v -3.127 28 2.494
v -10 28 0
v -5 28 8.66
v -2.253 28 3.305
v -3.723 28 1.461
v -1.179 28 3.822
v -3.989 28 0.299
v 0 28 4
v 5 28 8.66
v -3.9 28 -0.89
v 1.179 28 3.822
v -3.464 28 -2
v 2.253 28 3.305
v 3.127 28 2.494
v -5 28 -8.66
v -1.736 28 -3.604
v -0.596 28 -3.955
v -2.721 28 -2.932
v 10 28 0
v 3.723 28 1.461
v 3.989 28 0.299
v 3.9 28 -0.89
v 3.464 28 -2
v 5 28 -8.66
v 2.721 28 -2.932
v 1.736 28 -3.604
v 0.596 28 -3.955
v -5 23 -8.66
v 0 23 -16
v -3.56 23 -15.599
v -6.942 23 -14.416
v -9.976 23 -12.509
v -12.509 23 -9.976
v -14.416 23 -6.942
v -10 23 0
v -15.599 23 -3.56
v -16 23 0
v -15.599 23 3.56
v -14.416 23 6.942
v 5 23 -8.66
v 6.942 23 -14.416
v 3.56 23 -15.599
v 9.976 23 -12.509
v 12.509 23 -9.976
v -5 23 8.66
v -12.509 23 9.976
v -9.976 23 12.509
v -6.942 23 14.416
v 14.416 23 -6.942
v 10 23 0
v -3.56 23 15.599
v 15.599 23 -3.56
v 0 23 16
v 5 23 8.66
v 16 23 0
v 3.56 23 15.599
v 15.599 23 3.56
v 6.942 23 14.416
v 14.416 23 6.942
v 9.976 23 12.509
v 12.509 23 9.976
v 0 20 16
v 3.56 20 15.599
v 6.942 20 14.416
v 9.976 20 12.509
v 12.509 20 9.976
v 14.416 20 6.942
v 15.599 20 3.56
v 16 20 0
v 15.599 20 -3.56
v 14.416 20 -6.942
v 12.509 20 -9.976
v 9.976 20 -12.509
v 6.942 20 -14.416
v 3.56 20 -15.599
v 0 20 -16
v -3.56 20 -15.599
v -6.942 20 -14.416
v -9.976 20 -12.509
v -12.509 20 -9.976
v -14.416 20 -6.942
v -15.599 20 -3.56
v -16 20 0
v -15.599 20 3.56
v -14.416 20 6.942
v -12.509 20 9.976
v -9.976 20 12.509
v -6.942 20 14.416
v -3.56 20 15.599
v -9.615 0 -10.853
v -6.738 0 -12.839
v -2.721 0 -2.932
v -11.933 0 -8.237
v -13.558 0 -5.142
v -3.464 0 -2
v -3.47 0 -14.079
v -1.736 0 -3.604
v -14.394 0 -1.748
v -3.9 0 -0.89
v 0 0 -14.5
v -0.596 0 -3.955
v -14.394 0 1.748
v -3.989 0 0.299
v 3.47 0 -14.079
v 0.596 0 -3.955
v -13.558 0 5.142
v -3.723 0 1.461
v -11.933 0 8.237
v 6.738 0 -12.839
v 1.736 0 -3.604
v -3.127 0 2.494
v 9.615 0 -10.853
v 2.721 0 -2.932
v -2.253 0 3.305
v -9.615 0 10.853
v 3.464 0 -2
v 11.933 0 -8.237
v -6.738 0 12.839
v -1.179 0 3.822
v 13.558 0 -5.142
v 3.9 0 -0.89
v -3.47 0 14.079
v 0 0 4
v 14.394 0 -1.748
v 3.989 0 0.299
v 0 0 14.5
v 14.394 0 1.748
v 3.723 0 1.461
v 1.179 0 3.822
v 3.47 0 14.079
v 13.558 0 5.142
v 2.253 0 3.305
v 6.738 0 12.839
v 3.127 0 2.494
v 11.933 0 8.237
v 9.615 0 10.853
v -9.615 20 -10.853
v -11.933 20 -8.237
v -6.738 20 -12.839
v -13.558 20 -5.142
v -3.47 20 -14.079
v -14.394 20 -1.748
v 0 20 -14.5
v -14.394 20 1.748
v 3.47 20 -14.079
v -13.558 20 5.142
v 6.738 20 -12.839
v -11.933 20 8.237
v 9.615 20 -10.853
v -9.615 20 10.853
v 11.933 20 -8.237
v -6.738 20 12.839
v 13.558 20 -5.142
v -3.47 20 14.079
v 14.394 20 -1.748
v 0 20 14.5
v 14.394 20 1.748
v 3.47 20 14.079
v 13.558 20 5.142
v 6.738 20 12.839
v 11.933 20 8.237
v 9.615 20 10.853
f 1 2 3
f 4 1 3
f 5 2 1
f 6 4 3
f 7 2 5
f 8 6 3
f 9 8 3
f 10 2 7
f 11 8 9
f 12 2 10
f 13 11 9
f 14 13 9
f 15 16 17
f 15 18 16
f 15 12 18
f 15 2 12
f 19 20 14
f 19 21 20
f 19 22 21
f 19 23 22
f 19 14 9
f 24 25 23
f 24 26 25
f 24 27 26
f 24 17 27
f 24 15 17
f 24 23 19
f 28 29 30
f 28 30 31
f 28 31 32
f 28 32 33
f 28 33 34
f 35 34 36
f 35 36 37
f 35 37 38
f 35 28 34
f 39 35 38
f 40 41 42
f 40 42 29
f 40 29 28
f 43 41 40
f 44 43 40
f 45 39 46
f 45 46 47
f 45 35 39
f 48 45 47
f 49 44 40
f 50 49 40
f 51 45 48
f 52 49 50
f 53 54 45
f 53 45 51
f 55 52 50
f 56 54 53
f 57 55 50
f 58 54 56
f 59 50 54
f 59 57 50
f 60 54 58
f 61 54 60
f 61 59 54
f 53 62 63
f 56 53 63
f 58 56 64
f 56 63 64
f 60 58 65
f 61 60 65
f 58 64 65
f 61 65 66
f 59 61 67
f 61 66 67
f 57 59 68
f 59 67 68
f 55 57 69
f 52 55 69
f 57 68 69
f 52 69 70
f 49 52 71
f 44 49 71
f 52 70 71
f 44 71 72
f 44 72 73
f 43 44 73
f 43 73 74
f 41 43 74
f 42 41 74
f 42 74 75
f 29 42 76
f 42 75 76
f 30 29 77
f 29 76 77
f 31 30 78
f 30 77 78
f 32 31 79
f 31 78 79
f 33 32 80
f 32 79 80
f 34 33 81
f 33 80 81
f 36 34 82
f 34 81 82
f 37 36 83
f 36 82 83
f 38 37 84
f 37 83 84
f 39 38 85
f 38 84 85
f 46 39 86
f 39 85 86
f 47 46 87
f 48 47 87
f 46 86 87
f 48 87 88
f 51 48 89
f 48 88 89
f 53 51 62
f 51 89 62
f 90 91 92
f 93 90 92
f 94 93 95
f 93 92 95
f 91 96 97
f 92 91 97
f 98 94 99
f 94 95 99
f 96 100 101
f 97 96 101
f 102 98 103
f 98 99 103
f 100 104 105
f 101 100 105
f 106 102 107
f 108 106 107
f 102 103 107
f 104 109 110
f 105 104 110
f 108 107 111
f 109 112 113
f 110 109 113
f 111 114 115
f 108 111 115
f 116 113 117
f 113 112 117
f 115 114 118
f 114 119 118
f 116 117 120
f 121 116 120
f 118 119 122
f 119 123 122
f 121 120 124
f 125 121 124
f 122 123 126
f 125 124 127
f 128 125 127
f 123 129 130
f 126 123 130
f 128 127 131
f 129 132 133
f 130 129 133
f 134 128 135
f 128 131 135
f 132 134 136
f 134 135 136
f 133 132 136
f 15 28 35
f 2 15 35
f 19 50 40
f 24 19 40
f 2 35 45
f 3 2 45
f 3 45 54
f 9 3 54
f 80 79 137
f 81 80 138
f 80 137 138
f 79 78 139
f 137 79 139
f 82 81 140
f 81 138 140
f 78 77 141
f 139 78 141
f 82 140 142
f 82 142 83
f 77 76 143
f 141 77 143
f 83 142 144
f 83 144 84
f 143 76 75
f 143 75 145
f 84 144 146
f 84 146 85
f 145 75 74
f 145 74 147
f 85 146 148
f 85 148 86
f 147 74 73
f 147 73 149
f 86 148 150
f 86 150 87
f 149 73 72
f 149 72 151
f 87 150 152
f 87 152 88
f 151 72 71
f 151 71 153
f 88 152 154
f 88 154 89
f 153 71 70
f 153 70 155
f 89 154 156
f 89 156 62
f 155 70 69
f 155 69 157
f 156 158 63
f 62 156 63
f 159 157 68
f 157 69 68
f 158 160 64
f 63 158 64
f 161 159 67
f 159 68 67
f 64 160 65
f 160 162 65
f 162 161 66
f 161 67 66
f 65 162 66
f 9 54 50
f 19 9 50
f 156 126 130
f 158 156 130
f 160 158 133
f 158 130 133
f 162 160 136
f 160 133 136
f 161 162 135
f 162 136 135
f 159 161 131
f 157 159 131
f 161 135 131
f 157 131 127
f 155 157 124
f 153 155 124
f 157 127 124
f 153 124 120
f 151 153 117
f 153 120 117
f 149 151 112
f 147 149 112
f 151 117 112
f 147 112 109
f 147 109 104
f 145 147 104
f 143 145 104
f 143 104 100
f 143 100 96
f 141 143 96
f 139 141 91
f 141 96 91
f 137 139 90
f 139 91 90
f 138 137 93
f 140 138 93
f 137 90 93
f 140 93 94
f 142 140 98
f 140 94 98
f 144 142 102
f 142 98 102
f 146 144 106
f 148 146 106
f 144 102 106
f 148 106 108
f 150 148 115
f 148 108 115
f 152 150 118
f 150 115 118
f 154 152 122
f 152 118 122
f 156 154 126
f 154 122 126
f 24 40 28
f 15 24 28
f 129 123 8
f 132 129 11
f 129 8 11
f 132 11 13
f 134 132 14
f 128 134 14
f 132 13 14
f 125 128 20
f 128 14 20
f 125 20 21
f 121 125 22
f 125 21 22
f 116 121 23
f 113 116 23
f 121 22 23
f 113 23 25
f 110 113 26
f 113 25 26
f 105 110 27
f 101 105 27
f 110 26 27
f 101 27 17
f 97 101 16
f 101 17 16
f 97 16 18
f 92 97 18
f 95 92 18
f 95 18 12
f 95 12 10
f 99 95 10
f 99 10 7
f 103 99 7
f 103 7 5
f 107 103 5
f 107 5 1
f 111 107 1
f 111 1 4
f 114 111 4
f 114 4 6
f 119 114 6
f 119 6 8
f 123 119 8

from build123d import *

# Parameters (mm, degrees)
SKETCH1_R           = 14.5
BOSS_EXTRUDE1_DEPTH = 20
SKETCH2_R           = 16
BOSS_EXTRUDE2_DEPTH = 3
BOSS_EXTRUDE3_DEPTH = 5
SKETCH4_R           = 4
CUT_EXTRUDE1_DEPTH  = 30


with BuildPart() as part:
    # Sketch1 → Boss-Extrude1 (new body)
    with BuildSketch(Plane(origin=(0, 0, 0), x_dir=(1, 0, 0), z_dir=(0, 1, 0))):
        with Locations(Location((0, 0, 0), (0, 0, 270))):
            Circle(SKETCH1_R)
    extrude(amount=BOSS_EXTRUDE1_DEPTH)

    # Sketch2 → Boss-Extrude2 (add)
    with BuildSketch(Plane(origin=(0, 20, 0), x_dir=(1, 0, 0), z_dir=(0, 1, 0))):
        with Locations(Location((0, 0, 0), (0, 0, 270))):
            Circle(SKETCH2_R)
    extrude(amount=BOSS_EXTRUDE2_DEPTH)

    # Sketch3 → Boss-Extrude3 (add)
    with BuildSketch(Plane(origin=(0, 23, 0), x_dir=(1, 0, 0), z_dir=(0, 1, 0))):
        Polygon((10, 0), (5, 8.660254038), (-5, 8.660254038), (-10, 0), (-5, -8.660254038), (5, -8.660254038), align=None)
    extrude(amount=BOSS_EXTRUDE3_DEPTH)

    # Sketch4 → Cut-Extrude1 (cut)
    with BuildSketch(Plane(origin=(0, 28, 0), x_dir=(1, 0, 0), z_dir=(0, 1, 0))):
        with Locations(Location((0, 0, 0), (0, 0, 270))):
            Circle(SKETCH4_R)
    extrude(amount=-CUT_EXTRUDE1_DEPTH, mode=Mode.SUBTRACT)


solid = part.part
